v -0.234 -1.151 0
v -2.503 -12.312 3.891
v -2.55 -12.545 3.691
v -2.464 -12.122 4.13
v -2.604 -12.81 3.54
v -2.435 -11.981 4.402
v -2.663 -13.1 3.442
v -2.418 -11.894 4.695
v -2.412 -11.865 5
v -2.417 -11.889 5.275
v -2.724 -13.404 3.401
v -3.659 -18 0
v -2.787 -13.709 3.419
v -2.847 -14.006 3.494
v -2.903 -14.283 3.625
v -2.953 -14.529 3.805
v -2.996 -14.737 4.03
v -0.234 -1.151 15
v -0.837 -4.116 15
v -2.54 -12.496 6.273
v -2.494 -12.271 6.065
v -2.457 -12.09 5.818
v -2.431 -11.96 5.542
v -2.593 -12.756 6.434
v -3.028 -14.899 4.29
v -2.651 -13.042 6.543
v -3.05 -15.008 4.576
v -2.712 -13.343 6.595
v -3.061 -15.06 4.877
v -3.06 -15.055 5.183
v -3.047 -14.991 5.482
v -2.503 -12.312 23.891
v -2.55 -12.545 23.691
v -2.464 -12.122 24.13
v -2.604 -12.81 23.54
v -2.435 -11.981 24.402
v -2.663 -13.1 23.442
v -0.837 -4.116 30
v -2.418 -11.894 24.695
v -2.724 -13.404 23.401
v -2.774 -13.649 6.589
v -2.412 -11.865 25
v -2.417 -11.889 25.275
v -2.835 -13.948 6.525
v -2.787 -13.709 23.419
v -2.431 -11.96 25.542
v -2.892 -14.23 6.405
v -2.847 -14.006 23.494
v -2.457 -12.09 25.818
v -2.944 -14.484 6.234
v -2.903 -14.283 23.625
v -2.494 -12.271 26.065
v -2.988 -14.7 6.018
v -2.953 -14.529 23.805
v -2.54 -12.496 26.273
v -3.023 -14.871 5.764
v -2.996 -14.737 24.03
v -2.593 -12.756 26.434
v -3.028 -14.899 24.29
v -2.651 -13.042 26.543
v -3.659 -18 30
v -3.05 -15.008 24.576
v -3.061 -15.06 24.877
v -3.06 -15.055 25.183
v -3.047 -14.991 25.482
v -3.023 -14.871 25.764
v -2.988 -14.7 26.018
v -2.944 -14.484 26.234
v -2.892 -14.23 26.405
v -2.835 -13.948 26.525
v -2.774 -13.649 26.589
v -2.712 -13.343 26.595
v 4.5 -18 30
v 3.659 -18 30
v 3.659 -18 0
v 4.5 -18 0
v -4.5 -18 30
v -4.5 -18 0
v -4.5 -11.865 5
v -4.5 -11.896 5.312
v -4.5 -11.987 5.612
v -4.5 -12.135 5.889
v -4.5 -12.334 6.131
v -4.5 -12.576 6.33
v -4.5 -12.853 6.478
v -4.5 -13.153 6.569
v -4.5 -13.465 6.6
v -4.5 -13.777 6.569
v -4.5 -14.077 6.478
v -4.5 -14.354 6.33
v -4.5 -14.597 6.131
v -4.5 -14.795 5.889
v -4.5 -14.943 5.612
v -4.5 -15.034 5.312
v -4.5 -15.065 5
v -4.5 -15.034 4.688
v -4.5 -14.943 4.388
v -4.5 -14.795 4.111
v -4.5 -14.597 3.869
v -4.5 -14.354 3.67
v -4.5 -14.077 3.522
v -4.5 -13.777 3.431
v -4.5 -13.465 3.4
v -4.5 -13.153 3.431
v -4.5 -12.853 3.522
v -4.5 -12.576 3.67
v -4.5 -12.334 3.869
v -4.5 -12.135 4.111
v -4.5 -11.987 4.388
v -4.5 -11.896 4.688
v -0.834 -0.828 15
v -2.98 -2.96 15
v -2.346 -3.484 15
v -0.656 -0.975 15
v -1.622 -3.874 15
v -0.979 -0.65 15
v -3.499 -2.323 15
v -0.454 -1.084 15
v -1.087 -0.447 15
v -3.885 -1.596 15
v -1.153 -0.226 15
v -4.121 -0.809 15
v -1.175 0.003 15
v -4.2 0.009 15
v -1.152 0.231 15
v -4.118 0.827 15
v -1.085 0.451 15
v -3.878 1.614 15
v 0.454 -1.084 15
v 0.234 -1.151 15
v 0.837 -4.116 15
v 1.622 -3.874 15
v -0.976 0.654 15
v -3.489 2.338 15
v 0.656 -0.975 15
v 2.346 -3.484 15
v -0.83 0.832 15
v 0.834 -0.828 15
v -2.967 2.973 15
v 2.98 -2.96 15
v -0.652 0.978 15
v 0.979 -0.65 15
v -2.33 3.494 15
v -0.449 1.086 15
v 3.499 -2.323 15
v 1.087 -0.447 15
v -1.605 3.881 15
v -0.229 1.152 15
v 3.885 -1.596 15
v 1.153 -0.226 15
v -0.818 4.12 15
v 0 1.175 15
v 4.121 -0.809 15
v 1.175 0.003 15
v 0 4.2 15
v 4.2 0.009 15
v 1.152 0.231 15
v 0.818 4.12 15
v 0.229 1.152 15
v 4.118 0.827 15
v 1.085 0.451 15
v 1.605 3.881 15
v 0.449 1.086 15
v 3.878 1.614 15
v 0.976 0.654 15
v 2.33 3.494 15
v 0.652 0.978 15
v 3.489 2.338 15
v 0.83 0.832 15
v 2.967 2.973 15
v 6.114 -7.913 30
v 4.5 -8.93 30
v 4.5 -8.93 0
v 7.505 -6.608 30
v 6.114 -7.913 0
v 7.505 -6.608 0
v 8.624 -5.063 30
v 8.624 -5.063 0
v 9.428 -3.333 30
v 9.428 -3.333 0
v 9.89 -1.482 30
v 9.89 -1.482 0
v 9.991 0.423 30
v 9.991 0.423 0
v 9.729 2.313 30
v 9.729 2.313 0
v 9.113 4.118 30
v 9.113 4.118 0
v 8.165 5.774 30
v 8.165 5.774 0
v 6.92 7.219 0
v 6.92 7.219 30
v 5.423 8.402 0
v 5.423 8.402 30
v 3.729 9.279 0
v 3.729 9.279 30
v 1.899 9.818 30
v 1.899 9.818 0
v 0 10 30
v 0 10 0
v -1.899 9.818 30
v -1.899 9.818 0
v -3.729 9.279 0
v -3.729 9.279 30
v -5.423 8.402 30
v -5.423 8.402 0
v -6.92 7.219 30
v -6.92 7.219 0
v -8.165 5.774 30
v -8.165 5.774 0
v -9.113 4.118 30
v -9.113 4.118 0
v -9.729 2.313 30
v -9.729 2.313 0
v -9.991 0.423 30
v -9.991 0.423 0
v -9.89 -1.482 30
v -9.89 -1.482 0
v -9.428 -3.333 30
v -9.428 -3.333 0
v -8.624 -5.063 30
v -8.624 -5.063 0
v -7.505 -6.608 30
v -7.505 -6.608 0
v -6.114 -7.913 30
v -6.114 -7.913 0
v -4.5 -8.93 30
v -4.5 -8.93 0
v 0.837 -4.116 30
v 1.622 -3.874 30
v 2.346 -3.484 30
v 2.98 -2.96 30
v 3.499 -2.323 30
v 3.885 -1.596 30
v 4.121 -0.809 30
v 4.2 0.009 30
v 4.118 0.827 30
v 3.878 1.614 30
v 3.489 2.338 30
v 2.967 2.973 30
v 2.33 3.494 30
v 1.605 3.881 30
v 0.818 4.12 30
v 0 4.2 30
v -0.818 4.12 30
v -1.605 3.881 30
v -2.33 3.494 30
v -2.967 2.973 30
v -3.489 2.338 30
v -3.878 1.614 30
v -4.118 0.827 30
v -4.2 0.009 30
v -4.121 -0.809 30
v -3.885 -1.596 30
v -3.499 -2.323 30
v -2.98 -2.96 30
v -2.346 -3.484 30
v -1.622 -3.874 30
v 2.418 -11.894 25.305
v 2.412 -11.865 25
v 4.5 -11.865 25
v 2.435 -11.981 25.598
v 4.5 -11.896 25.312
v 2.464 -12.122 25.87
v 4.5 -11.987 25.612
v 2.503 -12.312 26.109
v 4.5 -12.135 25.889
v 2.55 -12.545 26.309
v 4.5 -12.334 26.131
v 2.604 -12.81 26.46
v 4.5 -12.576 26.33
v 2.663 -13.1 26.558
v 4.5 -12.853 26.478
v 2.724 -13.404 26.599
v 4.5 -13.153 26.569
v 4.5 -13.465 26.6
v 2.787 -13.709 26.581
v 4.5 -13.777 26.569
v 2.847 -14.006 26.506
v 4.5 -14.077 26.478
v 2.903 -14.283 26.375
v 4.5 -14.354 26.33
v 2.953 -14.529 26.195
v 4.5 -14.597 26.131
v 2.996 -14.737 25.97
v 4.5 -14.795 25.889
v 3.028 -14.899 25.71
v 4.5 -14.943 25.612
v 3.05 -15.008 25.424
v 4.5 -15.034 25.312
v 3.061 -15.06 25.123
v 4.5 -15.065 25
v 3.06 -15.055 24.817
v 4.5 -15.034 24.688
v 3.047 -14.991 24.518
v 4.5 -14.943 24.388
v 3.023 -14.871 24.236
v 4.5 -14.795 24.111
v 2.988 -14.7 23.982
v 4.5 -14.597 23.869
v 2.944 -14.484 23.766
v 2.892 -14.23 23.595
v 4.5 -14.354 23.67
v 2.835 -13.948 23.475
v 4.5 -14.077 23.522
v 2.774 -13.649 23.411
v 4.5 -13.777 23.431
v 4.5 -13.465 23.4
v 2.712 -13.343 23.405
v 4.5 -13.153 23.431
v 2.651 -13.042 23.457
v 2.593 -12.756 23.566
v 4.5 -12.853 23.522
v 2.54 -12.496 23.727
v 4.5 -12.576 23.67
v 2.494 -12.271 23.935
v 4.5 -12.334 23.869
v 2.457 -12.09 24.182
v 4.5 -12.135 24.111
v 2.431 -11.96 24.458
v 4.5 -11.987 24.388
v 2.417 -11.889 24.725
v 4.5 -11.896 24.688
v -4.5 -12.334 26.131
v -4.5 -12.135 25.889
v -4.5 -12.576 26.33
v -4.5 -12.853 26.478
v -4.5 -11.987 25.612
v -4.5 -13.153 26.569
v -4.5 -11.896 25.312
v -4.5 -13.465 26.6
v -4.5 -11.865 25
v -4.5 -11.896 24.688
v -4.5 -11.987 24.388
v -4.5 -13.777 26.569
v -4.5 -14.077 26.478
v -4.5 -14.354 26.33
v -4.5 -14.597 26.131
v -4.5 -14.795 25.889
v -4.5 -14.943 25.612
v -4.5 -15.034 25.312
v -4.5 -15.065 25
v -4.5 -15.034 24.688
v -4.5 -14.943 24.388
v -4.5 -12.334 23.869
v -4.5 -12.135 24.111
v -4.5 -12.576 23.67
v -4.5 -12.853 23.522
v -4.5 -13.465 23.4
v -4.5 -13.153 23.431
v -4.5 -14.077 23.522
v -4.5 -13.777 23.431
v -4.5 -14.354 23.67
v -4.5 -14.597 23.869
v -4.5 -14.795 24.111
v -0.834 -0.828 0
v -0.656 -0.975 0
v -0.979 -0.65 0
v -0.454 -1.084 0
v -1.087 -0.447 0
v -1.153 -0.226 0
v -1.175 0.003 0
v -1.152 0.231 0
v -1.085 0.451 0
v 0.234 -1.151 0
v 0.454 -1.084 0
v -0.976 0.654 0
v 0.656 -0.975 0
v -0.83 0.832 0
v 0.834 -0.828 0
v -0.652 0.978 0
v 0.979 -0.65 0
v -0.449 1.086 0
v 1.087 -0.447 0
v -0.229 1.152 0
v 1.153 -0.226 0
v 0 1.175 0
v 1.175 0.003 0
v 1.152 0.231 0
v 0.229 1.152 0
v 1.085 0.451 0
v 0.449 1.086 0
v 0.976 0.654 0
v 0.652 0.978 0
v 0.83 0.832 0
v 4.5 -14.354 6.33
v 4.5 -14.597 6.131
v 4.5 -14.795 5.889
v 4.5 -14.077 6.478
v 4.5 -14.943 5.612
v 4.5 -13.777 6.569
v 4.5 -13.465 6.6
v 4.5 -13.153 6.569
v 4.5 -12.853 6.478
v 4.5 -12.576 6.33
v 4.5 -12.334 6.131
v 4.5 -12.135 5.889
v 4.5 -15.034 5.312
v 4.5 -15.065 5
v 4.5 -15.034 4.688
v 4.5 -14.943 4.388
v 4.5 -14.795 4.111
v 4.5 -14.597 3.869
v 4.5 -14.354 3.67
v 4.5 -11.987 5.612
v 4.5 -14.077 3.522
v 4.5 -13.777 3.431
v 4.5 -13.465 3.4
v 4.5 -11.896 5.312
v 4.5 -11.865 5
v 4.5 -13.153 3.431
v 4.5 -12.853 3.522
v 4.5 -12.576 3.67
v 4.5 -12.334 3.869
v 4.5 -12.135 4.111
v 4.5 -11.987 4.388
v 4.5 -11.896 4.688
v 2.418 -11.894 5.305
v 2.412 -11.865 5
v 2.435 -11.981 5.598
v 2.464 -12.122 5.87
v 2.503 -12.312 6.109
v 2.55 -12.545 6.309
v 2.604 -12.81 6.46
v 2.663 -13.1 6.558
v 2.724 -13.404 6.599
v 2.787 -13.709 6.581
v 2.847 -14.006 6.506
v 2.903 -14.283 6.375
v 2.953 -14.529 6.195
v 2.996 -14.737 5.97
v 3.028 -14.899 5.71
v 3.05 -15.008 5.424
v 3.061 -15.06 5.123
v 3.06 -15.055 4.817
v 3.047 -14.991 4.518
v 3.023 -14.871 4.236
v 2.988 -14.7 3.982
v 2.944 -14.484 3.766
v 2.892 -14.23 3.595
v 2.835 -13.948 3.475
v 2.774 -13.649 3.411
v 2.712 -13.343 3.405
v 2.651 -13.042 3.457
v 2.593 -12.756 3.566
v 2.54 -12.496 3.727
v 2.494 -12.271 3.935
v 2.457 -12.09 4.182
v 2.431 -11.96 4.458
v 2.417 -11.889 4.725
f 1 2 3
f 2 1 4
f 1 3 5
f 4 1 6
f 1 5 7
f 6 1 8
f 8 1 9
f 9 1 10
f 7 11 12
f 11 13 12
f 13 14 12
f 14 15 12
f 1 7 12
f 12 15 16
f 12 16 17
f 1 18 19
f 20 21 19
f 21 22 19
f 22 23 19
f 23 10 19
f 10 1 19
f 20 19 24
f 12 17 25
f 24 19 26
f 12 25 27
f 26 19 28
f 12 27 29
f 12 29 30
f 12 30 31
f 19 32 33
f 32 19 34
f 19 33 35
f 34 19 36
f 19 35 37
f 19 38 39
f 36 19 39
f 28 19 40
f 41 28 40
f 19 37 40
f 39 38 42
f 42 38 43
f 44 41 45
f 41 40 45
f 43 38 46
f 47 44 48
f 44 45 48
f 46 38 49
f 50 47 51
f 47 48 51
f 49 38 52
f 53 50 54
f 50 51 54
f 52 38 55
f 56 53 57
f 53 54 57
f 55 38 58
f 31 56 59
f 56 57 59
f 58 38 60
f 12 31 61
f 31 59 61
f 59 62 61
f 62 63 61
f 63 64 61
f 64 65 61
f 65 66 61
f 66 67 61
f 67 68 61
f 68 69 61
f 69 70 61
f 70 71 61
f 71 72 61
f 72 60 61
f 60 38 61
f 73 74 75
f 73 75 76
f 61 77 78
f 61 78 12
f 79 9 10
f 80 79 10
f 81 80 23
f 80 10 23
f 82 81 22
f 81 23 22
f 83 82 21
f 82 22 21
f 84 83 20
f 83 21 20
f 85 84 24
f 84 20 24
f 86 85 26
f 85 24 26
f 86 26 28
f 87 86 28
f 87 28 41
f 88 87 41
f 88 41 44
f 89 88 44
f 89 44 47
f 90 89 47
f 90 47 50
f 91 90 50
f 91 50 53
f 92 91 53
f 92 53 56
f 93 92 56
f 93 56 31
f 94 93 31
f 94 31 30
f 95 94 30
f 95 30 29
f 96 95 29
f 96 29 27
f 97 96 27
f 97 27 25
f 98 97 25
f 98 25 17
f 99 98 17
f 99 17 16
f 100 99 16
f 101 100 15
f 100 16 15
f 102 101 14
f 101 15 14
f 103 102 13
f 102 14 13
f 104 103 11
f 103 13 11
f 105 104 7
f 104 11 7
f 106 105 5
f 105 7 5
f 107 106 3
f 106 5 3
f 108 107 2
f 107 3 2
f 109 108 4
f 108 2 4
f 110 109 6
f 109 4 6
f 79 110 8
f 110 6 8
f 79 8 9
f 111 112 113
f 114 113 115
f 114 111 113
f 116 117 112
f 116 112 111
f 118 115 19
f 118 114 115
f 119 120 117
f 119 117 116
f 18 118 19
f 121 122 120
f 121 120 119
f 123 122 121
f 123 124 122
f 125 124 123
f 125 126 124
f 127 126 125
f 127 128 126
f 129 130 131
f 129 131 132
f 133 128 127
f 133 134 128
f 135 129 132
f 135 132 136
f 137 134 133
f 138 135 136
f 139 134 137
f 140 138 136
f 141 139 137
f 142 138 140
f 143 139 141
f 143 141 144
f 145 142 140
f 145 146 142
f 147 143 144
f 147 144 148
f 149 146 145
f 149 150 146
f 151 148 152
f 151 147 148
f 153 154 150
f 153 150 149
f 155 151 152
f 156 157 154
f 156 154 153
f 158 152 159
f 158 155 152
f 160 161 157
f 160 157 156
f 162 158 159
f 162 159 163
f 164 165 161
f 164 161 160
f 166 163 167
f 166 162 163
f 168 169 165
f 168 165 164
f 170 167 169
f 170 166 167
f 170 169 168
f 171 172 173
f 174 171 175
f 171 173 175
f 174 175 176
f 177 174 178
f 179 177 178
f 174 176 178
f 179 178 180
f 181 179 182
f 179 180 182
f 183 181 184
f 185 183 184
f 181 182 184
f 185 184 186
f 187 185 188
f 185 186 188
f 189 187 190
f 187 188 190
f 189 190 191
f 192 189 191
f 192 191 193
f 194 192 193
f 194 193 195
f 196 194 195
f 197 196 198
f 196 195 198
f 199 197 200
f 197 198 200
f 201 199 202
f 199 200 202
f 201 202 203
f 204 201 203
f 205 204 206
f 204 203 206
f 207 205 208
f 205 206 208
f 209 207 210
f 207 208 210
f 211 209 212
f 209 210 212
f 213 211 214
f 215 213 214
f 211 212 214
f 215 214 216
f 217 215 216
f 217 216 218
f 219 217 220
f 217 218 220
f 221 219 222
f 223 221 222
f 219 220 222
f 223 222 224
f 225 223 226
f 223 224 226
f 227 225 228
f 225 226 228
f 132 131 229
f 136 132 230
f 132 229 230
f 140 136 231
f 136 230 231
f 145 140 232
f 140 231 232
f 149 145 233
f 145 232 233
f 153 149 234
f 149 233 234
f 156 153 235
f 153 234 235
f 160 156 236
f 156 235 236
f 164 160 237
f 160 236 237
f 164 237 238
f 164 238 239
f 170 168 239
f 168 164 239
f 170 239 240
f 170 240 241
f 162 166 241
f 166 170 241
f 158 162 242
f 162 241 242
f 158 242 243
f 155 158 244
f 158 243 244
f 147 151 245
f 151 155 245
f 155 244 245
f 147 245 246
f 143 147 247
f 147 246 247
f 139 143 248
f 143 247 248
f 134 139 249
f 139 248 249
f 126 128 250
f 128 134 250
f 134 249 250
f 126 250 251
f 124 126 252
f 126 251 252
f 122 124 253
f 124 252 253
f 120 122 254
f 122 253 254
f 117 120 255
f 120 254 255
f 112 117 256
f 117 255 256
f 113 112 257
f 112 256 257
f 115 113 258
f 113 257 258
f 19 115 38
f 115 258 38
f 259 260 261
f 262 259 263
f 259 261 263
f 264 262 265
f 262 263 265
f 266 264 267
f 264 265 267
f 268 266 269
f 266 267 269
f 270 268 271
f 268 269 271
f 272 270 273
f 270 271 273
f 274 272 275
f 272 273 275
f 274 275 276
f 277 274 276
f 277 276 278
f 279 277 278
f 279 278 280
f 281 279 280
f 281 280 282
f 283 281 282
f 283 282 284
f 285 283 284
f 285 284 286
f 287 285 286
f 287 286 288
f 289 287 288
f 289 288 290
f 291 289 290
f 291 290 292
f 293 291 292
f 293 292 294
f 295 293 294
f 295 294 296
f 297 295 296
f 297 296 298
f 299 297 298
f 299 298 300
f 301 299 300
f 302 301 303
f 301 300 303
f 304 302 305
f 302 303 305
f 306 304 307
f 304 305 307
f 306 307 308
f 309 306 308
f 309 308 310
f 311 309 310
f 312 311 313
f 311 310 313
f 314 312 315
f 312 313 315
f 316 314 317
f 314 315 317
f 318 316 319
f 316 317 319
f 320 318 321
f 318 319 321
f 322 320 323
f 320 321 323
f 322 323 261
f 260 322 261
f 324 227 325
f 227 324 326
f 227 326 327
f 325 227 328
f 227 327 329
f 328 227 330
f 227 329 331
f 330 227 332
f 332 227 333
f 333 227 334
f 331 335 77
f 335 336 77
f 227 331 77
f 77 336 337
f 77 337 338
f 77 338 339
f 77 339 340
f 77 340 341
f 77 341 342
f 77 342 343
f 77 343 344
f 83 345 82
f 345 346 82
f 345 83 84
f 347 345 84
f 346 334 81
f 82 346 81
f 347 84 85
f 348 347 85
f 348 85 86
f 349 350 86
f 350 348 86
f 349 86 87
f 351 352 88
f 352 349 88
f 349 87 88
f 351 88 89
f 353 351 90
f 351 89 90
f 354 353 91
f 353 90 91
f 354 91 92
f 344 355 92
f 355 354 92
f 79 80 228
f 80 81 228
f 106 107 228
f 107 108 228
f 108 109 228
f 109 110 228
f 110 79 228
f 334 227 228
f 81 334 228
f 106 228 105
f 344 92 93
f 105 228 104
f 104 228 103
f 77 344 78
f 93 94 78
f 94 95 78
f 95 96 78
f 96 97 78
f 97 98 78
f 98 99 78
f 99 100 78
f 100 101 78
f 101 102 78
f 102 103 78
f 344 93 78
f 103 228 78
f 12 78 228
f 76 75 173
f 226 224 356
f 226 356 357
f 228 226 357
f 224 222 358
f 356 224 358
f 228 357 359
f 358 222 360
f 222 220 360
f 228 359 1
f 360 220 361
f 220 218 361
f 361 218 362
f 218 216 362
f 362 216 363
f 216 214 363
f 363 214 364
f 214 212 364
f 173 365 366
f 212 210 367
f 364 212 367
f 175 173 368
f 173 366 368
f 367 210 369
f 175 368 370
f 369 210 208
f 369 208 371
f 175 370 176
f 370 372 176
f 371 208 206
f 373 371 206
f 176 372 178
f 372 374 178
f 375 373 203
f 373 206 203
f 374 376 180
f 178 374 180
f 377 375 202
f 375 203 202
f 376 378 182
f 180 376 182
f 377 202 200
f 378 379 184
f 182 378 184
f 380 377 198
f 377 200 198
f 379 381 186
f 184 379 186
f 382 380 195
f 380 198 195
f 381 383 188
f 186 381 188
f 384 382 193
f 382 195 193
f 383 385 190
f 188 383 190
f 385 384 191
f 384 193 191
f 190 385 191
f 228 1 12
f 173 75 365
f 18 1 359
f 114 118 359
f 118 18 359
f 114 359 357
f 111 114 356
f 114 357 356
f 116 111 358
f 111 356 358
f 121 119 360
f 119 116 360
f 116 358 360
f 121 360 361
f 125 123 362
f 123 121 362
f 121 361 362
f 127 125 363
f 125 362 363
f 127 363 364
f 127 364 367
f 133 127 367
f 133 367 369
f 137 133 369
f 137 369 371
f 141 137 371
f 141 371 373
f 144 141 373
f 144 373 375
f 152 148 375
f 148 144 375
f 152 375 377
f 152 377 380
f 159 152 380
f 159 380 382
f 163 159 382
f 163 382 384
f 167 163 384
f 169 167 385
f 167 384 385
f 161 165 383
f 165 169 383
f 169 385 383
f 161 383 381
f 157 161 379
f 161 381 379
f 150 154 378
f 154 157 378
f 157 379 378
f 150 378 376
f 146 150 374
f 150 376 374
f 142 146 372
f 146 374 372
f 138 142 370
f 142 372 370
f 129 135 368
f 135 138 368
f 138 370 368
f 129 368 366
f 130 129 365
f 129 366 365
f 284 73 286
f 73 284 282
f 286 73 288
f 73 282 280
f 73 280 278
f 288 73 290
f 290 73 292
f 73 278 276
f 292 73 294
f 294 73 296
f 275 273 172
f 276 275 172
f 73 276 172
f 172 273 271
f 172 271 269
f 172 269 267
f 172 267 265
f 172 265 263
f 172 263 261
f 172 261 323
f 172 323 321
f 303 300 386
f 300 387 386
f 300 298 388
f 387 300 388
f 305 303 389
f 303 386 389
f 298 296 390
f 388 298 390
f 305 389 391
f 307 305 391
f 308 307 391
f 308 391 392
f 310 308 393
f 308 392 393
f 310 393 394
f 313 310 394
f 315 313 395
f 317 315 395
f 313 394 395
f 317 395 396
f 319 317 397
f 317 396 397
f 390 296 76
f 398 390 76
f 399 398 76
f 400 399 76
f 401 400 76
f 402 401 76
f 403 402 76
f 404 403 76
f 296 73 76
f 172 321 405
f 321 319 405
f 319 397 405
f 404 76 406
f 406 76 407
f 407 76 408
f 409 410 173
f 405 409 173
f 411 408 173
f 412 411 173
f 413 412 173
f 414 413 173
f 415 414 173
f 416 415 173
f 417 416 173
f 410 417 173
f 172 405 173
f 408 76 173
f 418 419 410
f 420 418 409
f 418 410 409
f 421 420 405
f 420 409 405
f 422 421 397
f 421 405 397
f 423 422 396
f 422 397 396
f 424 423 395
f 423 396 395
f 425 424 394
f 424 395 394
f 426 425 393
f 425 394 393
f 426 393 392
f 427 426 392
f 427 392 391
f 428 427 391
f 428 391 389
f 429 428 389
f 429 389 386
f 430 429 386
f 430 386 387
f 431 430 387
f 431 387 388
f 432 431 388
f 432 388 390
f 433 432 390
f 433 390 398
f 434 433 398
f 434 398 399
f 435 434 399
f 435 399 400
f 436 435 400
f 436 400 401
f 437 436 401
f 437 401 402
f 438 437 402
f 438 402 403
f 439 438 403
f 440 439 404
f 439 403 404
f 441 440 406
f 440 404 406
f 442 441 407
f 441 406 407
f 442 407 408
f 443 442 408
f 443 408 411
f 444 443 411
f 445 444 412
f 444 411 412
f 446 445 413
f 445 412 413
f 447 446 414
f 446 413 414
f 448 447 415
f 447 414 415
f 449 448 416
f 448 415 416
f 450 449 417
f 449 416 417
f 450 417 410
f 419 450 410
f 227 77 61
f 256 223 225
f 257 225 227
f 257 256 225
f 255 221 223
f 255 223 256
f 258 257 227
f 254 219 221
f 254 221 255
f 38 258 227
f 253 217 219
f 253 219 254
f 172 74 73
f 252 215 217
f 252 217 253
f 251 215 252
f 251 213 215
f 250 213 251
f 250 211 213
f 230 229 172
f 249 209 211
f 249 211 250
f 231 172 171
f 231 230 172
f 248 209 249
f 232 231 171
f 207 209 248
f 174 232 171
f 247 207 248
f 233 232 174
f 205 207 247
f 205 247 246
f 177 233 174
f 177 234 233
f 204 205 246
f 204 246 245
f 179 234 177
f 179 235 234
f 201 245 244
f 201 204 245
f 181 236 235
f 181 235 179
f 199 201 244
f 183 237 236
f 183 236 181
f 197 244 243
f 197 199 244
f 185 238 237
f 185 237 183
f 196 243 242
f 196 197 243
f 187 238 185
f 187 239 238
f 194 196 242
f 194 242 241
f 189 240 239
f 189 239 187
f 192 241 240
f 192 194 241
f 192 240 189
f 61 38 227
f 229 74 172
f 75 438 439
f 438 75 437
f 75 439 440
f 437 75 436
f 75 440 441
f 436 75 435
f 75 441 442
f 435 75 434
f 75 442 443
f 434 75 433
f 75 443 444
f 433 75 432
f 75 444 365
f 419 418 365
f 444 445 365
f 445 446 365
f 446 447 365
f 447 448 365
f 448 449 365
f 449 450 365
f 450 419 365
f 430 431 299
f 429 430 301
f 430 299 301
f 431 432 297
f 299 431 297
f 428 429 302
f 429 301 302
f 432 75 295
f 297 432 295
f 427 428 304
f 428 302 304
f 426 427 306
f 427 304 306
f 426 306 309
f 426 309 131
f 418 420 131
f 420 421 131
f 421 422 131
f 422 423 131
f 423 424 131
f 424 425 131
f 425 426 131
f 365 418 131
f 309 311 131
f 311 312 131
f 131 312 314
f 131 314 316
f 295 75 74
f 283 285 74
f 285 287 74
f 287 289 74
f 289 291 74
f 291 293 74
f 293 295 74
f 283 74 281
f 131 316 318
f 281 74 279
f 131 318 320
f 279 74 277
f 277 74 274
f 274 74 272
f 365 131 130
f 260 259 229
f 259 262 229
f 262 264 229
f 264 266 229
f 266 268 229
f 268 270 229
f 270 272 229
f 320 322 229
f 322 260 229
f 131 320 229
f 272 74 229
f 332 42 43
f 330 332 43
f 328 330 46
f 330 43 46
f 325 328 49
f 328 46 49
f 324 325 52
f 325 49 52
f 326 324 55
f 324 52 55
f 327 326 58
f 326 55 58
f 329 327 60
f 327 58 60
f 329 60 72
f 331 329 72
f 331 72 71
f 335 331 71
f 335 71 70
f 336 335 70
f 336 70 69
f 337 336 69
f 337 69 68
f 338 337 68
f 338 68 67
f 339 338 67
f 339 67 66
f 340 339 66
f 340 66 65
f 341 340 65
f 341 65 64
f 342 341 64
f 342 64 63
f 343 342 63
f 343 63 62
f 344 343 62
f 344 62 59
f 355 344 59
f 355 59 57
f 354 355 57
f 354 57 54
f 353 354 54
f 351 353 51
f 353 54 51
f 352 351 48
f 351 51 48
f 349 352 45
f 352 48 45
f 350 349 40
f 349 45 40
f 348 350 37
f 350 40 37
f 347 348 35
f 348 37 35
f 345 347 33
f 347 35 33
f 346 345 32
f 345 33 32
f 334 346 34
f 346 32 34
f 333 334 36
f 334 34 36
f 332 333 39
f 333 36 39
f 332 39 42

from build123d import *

# Parameters (mm, degrees)
EXTRUDE_1_DEPTH     = 30
SKETCH_2_R          = 4.2
CUT_EXTRUDE_1_DEPTH = 15
SKETCH_3_R          = 1.175
CUT_EXTRUDE_2_DEPTH = 15
SKETCH_10_R         = 1.6
CUT_EXTRUDE_8_DEPTH = 38.871493237
CUT_EXTRUDE_9_DEPTH = 37.386810797


with BuildPart() as part:
    # ｽｹｯﾁ1 → ﾎﾞｽ - 押し出し1 (new body)
    with BuildSketch(Plane.XY):
        with BuildLine():
            Line((-4.5, -8.93028555), (-4.5, -18))
            Line((-4.5, -18), (4.5, -18))
            Line((4.5, -18), (4.5, -8.93028555))
            ThreePointArc((4.5, -8.93028555), (0, 10), (-4.5, -8.93028555))
        make_face()
    extrude(amount=EXTRUDE_1_DEPTH)

    # ｽｹｯﾁ2 → ｶｯﾄ - 押し出し1 (cut)
    with BuildSketch(Plane.XY.offset(30)):
        Circle(SKETCH_2_R)
    extrude(amount=-CUT_EXTRUDE_1_DEPTH, mode=Mode.SUBTRACT)

    # ｽｹｯﾁ3 → ｶｯﾄ - 押し出し2 (cut)
    with BuildSketch(Plane(origin=(0, 0, 0), x_dir=(-1, 0, 0), z_dir=(0, 0, -1))):
        Circle(SKETCH_3_R)
    extrude(amount=-CUT_EXTRUDE_2_DEPTH, mode=Mode.SUBTRACT)

    # ｽｹｯﾁ10 → ｶｯﾄ - 押し出し8 (cut, through all)
    with BuildSketch(Plane(origin=(4.5, 0, 0), x_dir=(0, 0, -1), z_dir=(1, 0, 0))):
        with Locations(Location((-25, -13.465142775, 0), (0, 0, 90))):
            Circle(SKETCH_10_R)
        with Locations(Location((-5, -13.465142775, 0), (0, 0, 90))):
            Circle(SKETCH_10_R)
    extrude(amount=-CUT_EXTRUDE_8_DEPTH, mode=Mode.SUBTRACT)

    # ｽｹｯﾁ4 → ｶｯﾄ - 押し出し9 (cut, through all)
    with BuildSketch(Plane.XY.offset(30)):
        with BuildLine():
            Line((-0.234043532, -1.151455003), (-3.658661061, -18))
            ThreePointArc((-3.658661061, -18), (0, -18.368064698), (3.658661061, -18))
            Line((3.658661061, -18), (0.234043532, -1.151455003))
            ThreePointArc((0.234043532, -1.151455003), (0, -1.175), (-0.234043532, -1.151455003))
        make_face()
    extrude(amount=-CUT_EXTRUDE_9_DEPTH, mode=Mode.SUBTRACT)


solid = part.part
